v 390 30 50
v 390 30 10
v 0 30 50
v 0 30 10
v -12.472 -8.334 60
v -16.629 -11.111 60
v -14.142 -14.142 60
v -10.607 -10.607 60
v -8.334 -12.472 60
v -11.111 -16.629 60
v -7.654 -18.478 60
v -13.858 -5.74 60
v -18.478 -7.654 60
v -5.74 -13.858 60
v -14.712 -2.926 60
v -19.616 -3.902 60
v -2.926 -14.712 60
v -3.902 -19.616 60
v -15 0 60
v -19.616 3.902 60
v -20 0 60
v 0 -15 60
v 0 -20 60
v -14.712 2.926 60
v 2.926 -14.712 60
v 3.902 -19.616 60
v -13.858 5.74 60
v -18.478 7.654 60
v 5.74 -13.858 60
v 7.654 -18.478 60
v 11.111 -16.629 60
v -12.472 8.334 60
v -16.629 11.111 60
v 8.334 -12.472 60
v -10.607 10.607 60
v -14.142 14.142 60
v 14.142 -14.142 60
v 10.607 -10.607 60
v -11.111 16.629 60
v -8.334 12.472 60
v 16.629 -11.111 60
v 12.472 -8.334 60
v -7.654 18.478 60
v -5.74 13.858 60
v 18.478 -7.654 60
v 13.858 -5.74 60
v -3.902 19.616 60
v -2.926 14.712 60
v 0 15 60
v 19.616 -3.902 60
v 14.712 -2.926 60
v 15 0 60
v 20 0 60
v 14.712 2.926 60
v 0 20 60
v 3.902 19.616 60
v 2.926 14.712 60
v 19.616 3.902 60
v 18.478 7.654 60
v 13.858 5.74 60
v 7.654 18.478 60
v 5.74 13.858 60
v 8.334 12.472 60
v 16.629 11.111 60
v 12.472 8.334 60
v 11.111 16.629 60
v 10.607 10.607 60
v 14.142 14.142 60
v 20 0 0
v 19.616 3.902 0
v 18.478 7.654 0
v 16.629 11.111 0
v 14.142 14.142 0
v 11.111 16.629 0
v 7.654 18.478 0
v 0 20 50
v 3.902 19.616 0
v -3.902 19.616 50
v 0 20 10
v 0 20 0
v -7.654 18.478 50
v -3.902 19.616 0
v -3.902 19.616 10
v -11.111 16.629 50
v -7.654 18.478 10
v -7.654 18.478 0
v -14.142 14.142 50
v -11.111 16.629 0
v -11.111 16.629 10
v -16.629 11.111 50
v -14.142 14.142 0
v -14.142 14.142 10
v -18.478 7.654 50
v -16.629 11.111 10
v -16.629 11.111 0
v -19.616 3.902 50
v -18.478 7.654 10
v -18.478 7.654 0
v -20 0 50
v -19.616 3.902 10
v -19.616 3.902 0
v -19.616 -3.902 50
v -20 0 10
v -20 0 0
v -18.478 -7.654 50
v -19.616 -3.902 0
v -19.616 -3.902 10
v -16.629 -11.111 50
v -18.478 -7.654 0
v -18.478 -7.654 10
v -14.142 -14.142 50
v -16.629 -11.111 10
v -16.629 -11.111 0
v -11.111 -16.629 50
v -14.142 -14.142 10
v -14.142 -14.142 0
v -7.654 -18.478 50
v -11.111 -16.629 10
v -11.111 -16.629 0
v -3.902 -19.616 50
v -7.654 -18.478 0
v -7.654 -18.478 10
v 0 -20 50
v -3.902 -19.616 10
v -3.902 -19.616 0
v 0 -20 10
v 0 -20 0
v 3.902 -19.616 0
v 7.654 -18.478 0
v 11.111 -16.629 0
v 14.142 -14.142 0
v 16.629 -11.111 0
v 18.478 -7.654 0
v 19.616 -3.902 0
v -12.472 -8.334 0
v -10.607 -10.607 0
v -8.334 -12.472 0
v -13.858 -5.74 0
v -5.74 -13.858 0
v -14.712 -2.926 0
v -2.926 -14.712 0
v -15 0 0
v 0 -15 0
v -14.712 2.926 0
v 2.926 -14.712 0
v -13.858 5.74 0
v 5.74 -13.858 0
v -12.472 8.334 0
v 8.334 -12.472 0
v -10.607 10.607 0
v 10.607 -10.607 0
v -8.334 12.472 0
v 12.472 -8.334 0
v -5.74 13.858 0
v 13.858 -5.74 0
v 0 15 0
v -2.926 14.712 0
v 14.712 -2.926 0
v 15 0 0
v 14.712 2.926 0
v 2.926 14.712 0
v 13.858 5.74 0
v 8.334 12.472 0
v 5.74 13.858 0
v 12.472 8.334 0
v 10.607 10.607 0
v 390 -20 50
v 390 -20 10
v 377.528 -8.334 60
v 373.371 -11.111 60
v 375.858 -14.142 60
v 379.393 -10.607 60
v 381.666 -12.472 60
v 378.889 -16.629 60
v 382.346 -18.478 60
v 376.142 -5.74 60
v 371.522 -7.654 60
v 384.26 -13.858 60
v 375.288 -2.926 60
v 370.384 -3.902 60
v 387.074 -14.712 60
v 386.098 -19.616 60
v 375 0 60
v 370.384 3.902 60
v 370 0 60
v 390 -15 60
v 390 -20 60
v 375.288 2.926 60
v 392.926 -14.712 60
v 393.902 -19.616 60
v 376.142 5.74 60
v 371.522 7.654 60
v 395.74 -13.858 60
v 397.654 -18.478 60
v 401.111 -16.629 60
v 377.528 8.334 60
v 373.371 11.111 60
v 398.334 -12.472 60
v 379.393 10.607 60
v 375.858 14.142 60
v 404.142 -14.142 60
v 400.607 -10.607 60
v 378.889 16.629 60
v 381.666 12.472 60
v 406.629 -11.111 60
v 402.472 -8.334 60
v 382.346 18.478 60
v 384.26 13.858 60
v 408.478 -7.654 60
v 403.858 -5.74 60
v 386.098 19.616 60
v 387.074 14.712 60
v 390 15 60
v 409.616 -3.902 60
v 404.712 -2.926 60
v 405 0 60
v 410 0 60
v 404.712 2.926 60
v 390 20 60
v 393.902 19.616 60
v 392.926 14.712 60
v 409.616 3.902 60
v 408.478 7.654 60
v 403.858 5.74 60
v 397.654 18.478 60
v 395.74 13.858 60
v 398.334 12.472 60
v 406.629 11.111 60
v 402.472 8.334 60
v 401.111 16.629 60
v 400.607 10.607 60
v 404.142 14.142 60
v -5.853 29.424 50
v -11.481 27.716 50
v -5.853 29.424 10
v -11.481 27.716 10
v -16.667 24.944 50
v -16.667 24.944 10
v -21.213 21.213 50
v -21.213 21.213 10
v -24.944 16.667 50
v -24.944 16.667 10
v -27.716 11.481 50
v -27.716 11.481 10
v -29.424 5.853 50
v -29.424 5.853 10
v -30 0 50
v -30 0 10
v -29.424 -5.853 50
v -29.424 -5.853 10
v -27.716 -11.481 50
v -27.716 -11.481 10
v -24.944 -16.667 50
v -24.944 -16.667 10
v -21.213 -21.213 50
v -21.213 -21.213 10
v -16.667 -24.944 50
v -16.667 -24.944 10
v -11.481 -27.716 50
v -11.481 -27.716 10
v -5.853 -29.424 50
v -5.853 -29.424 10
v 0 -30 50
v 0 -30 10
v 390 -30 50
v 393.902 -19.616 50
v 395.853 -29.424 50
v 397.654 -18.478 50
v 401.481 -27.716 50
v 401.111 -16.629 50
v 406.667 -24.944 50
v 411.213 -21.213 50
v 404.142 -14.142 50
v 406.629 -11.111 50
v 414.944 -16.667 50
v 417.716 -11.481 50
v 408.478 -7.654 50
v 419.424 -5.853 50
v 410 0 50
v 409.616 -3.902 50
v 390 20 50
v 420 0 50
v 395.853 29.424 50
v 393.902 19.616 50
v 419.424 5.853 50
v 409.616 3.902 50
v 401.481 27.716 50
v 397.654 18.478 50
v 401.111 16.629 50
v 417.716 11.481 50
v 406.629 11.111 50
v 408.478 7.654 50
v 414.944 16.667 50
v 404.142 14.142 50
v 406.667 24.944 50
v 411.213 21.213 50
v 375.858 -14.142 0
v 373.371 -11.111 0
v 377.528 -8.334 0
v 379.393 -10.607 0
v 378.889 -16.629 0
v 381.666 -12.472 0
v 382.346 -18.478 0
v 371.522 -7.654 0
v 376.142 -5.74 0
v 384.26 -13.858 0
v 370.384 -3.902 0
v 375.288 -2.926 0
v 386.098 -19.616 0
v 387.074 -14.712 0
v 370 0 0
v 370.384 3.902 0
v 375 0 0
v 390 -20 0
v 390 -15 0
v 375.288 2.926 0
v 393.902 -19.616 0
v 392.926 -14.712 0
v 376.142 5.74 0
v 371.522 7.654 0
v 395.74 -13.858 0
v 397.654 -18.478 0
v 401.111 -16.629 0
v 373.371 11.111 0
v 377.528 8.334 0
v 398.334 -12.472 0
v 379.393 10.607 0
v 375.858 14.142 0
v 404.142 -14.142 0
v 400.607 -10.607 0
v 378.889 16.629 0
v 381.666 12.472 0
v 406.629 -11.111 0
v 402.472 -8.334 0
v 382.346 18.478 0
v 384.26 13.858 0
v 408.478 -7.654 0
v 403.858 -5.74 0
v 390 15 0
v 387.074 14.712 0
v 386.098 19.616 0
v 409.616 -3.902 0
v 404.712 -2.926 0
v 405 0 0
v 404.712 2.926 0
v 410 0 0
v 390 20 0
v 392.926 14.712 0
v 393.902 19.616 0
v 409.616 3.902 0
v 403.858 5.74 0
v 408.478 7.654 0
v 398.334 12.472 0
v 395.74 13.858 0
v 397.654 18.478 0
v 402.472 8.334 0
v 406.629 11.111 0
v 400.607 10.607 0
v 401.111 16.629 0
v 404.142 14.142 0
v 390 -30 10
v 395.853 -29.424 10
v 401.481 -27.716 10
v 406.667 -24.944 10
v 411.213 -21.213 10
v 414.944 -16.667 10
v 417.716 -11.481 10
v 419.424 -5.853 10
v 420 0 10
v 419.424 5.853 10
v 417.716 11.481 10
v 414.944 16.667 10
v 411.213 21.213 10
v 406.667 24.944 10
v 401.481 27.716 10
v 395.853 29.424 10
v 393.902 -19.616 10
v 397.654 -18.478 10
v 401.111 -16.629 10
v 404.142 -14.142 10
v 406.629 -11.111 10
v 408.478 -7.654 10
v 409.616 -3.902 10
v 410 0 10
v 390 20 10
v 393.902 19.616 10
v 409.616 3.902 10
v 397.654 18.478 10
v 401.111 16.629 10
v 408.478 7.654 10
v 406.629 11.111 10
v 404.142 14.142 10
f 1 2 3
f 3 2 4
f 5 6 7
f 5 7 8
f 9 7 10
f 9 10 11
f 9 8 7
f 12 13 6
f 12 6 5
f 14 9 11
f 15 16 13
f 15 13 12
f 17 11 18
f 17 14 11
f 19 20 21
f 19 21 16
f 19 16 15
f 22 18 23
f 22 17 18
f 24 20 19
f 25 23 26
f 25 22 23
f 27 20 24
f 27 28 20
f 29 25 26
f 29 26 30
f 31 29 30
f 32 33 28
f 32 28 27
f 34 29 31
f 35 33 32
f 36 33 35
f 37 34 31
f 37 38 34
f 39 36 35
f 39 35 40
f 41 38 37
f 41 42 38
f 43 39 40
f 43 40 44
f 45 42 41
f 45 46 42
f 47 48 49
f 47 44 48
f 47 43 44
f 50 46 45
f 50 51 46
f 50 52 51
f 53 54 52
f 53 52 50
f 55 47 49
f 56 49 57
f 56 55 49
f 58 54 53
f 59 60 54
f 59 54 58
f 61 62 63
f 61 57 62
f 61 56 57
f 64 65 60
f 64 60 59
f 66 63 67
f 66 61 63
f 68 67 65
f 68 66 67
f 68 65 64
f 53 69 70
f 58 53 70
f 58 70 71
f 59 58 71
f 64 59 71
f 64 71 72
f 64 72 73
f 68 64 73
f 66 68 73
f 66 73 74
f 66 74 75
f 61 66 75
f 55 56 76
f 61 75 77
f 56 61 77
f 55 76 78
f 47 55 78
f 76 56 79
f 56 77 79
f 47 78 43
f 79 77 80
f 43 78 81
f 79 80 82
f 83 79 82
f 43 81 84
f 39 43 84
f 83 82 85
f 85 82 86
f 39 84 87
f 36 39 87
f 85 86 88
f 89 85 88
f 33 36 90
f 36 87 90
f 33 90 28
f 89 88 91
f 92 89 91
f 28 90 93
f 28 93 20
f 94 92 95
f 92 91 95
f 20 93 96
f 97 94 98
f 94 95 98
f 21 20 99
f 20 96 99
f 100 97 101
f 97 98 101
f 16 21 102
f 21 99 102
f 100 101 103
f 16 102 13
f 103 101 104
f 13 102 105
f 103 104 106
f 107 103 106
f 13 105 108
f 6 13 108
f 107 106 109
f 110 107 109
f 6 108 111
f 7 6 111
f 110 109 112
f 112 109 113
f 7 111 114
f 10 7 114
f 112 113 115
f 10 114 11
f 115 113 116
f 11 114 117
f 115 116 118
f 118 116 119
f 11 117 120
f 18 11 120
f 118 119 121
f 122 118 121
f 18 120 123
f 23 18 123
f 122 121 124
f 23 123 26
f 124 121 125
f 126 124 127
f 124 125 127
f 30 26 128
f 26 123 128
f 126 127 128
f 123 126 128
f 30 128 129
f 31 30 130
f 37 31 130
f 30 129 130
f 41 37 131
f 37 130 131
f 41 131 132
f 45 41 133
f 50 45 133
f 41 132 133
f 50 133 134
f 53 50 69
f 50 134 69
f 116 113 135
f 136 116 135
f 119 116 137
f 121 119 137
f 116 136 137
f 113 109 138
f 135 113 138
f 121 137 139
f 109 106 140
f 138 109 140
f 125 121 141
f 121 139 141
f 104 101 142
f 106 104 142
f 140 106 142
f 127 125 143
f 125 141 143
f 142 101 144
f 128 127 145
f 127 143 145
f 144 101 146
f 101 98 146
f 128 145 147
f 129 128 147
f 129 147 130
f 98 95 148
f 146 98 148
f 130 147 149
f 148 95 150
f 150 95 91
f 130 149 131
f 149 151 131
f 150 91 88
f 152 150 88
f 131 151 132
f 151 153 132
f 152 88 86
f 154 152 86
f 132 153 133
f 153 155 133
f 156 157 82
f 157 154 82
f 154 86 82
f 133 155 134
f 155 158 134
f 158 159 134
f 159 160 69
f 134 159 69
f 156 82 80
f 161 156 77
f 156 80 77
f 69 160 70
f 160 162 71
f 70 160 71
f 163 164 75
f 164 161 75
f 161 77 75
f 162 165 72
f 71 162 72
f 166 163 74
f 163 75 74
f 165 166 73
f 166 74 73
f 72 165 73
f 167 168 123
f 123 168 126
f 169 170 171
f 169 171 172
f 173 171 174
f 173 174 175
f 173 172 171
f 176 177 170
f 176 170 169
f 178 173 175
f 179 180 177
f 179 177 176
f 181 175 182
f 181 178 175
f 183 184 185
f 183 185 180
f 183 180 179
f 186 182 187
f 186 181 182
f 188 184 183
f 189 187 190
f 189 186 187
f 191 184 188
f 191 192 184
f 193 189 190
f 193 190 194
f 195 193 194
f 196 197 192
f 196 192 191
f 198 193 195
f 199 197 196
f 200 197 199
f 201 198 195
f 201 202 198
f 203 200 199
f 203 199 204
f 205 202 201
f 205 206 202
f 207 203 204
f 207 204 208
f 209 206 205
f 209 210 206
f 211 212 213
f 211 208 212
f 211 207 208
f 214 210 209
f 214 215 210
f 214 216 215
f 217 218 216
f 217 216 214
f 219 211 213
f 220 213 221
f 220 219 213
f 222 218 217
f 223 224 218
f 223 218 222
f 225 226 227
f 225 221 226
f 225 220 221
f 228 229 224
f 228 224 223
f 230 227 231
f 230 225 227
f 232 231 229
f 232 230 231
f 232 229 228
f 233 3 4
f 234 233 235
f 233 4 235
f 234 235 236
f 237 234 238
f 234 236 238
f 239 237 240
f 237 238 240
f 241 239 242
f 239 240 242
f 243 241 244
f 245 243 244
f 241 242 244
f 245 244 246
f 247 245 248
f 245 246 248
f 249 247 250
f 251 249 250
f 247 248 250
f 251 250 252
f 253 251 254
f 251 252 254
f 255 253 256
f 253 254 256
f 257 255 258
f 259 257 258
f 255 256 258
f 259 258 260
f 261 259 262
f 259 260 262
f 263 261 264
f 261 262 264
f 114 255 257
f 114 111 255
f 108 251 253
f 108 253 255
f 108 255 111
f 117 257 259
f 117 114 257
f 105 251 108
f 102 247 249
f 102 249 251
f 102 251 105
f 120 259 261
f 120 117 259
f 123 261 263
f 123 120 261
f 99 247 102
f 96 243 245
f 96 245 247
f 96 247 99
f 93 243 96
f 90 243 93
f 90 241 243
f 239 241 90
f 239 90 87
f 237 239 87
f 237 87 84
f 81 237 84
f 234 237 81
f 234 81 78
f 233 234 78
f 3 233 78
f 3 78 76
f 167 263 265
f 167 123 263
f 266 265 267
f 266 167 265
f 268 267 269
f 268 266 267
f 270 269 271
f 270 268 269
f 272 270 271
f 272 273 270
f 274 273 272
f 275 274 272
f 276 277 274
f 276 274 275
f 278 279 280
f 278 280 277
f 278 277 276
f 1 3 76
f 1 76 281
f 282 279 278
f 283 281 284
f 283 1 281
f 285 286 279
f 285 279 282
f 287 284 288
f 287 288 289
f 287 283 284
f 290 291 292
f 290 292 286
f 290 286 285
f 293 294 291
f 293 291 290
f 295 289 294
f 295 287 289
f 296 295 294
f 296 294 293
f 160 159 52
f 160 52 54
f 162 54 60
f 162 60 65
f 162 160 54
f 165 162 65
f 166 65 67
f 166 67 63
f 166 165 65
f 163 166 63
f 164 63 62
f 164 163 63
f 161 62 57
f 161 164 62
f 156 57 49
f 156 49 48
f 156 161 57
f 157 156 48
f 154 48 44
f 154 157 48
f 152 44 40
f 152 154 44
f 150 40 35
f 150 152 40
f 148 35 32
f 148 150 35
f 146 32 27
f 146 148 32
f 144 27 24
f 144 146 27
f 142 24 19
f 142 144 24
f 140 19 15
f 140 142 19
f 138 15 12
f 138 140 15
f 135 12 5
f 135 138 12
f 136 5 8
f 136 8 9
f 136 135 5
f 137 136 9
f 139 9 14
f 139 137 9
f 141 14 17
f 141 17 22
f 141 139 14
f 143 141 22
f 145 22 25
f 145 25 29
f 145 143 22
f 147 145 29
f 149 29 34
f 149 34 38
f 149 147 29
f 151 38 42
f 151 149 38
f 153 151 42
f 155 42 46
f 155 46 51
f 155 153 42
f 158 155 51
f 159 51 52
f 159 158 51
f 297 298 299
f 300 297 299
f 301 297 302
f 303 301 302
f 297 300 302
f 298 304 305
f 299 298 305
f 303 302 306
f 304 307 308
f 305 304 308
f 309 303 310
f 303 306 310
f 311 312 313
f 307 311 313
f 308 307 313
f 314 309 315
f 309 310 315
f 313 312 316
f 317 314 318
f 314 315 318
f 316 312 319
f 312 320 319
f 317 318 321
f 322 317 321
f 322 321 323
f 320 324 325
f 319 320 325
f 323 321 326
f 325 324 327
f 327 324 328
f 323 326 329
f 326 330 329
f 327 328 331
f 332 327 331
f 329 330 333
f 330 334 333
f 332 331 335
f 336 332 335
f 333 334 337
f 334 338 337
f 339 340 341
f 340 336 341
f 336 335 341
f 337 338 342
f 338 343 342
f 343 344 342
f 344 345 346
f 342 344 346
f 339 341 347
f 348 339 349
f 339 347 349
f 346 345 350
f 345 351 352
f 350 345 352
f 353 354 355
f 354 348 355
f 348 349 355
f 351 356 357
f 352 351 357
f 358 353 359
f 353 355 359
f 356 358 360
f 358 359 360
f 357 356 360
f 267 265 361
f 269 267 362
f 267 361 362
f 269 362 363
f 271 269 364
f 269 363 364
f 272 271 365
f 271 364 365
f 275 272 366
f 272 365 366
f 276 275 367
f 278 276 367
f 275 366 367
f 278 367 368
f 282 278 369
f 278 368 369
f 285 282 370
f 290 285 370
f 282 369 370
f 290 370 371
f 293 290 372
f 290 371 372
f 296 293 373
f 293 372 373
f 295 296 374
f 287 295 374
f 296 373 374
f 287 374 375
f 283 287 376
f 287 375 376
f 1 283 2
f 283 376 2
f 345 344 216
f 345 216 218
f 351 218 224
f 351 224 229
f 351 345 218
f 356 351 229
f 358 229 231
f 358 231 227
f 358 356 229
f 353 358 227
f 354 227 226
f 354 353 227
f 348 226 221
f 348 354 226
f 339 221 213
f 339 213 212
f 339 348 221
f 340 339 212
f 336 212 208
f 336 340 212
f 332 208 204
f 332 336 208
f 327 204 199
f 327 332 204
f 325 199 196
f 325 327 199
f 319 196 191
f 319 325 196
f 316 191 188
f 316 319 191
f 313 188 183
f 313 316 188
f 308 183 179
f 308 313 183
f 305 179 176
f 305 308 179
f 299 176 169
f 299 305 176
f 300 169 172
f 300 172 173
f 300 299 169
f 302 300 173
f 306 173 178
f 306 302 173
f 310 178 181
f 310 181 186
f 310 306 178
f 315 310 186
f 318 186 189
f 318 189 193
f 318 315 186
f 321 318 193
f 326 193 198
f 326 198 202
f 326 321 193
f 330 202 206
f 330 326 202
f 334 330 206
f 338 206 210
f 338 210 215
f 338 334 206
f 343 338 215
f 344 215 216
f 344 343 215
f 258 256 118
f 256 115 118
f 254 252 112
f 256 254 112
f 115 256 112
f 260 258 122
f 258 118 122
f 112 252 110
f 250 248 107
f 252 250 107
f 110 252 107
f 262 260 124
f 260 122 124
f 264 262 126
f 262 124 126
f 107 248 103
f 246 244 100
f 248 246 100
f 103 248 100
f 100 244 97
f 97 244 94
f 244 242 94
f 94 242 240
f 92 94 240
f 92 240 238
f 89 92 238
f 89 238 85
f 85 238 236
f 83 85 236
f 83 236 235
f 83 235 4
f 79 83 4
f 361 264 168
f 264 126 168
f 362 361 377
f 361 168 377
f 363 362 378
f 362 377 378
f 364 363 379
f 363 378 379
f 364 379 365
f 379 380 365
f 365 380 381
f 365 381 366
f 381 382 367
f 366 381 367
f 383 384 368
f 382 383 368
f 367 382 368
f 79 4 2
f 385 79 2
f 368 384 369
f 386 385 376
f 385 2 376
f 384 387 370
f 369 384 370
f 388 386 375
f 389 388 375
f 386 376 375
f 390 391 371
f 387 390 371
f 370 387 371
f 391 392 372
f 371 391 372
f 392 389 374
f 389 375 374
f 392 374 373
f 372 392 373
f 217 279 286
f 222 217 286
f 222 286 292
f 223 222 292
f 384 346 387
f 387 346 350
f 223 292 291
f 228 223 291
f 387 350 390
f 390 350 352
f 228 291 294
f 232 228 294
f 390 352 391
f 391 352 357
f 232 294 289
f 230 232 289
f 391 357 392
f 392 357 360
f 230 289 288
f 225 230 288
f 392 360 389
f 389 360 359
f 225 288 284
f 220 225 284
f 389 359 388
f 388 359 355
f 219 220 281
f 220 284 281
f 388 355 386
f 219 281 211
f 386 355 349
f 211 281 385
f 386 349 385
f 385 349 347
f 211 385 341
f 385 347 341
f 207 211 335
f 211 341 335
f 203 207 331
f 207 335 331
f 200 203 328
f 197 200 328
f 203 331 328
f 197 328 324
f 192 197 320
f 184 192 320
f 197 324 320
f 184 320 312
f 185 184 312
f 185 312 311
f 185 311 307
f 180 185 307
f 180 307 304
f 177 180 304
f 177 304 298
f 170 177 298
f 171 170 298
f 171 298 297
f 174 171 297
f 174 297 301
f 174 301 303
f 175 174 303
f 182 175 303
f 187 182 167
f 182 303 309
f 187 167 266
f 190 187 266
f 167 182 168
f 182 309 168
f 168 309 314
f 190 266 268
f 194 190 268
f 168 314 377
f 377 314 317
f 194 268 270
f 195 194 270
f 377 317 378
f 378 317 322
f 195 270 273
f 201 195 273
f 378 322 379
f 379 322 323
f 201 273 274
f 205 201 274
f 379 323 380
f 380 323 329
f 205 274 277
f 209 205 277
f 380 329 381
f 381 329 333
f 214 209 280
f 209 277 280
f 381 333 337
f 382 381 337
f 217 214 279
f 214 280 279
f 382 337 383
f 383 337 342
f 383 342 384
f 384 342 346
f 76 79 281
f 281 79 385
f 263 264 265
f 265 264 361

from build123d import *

# Parameters (mm, degrees)
SKETCH1_R             = 20
SKETCH1_R_2           = 15
BOSS_EXTRUDE1_DEPTH   = 60
BOSS_EXTRUDE1_2_DEPTH = 60
BOSS_EXTRUDE2_START   = -50
BOSS_EXTRUDE2_DEPTH   = 40


with BuildPart() as part:
    # Sketch1 → Boss-Extrude1 (new body)
    with BuildSketch(Plane.XY):
        Circle(SKETCH1_R)
        Circle(SKETCH1_R_2, mode=Mode.SUBTRACT)
    extrude(amount=BOSS_EXTRUDE1_DEPTH)



with BuildPart() as body_2:
    # Sketch1 → Boss-Extrude1 2 (new body)
    with BuildSketch(Plane.XY):
        with Locations((390, 0)):
            Circle(SKETCH1_R)
        with Locations((390, 0)):
            Circle(SKETCH1_R_2, mode=Mode.SUBTRACT)
    extrude(amount=BOSS_EXTRUDE1_2_DEPTH)


with BuildPart() as part_1:
    add(part.part)

    add(body_2.part)  # Boss-Extrude2 merges body 2
    # Sketch2 → Boss-Extrude2 (add)
    with BuildSketch(Plane.XY.offset(60).offset(BOSS_EXTRUDE2_START)):
        with BuildLine():
            Line((0, -30), (390, -30))
            ThreePointArc((390, -30), (420, 0), (390, 30))
            Line((390, 30), (0, 30))
            ThreePointArc((0, 30), (-30, 0), (0, -30))
        make_face()
        with BuildLine():
            Line((0, 20), (390, 20))
            ThreePointArc((390, 20), (410, 0), (390, -20))
            Line((390, -20), (0, -20))
            ThreePointArc((0, -20), (-20, 0), (0, 20))
        make_face(mode=Mode.SUBTRACT)
    extrude(amount=BOSS_EXTRUDE2_DEPTH)


solid = part_1.part
